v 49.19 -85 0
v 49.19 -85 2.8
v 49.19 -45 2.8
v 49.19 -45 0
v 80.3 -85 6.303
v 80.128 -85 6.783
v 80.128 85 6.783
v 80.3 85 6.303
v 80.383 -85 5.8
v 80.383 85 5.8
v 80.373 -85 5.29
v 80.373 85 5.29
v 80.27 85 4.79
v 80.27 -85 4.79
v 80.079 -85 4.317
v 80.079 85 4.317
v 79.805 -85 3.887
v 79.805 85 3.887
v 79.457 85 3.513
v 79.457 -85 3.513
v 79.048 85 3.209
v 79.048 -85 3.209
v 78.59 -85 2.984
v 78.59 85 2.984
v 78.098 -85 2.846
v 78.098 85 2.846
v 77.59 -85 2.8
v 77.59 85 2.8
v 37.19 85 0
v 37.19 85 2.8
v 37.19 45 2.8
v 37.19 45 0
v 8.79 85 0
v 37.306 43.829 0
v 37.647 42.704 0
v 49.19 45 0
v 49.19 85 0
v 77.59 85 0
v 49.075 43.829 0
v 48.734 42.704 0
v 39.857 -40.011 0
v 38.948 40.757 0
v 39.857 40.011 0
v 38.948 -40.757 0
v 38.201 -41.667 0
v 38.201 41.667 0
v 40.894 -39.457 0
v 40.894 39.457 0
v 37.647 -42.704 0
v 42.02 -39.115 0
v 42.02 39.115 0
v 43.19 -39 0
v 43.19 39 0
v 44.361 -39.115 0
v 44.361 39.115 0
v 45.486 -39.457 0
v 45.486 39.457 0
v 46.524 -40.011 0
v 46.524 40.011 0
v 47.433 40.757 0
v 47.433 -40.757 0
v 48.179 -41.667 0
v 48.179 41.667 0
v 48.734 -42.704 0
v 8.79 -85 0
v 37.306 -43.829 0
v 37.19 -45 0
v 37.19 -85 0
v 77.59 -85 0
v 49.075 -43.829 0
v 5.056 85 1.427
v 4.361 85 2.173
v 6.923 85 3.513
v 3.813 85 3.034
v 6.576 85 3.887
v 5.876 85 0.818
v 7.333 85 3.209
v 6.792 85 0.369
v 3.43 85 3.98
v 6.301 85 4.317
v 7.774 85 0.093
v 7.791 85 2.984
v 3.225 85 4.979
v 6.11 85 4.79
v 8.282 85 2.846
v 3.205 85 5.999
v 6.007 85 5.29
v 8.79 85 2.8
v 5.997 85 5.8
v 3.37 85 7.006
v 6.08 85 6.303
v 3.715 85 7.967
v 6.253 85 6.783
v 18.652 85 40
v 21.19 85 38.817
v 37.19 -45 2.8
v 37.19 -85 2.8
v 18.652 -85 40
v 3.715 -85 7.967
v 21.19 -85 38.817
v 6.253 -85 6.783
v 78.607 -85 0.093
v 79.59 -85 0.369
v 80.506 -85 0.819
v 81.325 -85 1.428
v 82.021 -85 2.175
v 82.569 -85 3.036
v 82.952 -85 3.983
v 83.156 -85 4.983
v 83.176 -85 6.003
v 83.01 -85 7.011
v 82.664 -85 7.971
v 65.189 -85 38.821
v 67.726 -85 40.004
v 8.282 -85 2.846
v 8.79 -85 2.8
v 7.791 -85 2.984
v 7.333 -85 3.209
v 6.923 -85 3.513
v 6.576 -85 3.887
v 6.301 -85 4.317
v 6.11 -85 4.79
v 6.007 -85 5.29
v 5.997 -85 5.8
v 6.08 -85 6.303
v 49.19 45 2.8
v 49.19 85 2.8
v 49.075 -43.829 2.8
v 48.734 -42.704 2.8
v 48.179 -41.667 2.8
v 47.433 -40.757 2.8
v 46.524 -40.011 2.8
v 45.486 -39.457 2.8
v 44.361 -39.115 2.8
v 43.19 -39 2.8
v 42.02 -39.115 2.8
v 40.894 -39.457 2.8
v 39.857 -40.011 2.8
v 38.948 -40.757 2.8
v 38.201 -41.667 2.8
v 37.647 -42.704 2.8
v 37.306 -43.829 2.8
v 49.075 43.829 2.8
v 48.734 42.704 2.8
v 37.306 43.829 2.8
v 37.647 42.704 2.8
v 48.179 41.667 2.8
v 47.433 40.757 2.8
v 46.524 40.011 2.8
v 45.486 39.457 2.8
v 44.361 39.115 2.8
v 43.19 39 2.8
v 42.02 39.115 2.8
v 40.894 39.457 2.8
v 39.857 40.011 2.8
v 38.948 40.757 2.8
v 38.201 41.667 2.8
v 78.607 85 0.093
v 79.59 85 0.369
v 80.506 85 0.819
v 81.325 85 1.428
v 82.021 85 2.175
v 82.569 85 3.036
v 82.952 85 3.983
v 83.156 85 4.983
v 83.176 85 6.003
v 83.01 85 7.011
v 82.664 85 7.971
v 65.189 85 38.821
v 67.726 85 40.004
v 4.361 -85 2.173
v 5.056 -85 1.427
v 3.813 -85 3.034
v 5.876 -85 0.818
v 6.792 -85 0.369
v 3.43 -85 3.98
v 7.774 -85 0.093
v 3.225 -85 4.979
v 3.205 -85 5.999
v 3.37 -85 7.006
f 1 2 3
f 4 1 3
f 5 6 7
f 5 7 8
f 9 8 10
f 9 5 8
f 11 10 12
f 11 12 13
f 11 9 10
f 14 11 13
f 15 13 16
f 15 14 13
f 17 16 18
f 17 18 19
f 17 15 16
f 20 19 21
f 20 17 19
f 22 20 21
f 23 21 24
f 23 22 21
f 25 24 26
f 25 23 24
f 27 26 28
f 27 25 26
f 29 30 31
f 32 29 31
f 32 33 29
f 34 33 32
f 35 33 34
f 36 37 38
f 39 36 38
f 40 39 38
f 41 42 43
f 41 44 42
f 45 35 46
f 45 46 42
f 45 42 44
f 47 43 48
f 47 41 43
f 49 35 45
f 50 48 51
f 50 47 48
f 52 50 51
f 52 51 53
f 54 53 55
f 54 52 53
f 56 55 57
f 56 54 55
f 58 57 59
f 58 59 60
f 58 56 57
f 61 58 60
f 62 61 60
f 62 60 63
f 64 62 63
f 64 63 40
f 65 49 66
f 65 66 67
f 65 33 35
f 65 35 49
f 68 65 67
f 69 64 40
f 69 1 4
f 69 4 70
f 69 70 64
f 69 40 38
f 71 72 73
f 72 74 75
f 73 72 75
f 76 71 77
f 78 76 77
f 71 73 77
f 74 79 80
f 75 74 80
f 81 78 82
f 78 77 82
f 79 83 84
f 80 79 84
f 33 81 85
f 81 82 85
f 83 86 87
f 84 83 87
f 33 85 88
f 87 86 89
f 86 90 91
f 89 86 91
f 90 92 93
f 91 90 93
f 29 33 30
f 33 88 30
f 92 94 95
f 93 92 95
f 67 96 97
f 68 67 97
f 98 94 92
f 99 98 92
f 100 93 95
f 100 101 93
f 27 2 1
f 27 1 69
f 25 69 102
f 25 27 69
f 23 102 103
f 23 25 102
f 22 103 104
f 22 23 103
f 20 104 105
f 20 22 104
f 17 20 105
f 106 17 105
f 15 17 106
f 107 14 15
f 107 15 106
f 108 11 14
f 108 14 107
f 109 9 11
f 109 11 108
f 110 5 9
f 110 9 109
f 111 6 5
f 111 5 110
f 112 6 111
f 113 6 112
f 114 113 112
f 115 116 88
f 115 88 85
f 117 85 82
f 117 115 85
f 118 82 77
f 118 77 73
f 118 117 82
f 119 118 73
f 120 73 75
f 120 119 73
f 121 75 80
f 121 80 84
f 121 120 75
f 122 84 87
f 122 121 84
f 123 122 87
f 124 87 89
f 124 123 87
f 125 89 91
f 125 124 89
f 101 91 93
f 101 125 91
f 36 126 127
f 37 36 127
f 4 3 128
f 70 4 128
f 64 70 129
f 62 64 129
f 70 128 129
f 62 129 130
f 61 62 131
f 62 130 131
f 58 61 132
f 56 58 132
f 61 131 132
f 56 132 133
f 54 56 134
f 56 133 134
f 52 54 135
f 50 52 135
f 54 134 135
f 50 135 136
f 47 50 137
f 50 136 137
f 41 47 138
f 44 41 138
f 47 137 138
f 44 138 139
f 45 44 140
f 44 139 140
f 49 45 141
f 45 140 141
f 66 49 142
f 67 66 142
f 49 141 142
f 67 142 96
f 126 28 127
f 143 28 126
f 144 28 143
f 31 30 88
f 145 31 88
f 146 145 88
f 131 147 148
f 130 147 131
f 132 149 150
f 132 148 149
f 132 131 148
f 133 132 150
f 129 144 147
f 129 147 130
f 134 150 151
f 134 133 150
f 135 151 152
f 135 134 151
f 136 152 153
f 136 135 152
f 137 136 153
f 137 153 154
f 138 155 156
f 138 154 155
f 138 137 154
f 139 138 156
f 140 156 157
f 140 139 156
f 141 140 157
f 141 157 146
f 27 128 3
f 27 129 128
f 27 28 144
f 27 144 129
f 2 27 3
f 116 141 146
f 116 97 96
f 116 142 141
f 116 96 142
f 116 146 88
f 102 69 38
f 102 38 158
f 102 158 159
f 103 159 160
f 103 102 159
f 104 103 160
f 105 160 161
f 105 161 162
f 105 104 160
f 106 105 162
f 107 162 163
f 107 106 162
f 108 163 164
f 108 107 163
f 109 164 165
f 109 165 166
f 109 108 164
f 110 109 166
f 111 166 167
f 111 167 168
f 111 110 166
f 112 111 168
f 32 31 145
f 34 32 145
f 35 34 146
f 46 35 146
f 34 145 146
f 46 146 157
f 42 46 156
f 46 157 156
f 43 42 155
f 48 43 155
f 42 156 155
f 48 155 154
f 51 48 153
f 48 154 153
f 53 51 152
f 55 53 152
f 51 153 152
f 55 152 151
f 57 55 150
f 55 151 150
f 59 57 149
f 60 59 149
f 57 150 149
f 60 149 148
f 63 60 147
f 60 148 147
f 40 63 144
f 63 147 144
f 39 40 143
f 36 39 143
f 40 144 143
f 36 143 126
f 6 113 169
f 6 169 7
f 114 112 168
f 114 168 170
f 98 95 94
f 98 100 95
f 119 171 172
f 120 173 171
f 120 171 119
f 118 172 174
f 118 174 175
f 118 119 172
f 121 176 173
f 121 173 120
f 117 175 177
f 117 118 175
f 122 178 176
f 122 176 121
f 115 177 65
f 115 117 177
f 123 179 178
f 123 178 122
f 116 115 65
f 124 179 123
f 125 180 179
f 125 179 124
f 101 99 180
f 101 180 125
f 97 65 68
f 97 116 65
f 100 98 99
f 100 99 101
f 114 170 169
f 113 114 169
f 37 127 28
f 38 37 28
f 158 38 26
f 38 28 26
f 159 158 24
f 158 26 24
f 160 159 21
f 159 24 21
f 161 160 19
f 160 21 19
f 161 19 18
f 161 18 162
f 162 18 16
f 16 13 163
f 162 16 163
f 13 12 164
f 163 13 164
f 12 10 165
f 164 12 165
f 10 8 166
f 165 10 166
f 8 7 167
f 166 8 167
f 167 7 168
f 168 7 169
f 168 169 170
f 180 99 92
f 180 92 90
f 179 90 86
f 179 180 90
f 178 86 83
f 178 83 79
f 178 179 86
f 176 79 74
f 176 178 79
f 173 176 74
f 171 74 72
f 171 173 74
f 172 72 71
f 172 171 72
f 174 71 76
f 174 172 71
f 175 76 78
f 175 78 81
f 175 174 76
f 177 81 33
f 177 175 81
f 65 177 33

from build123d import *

# Parameters (mm, degrees)
F1_DEPTH = 85
F3_DEPTH = 2.801


with BuildPart() as f1:
    # F0 (on Front) → F1 (new body, symmetric)
    with BuildSketch(Plane.XZ):
        with BuildLine():
            Line((18.652306, 40), (3.714916, 7.966662))
            ThreePointArc((3.714916, 7.966662), (4.067247, 2.591122), (8.790239, 0))
            Line((8.790239, 0), (77.590239, 0))
            ThreePointArc((77.590239, 0), (82.31449, 2.593095), (82.663585, 7.970904))
            Line((82.663585, 7.970904), (67.726194, 40.004241))
            Line((67.726194, 40.004241), (65.188533, 38.82091))
            Line((65.188533, 38.82091), (80.127901, 6.783331))
            ThreePointArc((80.127901, 6.783331), (79.951735, 4.095561), (77.590239, 2.8))
            Line((77.590239, 2.8), (8.790239, 2.8))
            ThreePointArc((8.790239, 2.8), (6.428743, 4.095561), (6.252577, 6.783331))
            Line((6.252577, 6.783331), (21.189968, 38.816669))
            Line((21.189968, 38.816669), (18.652306, 40))
        make_face()
    extrude(amount=F1_DEPTH, both=True)

    # F2 (on face) → F3 (cut, through all)
    with BuildSketch(Plane.XY.offset(2.8)):
        with BuildLine():
            Line((49.190239, -85), (49.190239, -45))
            ThreePointArc((49.190239, -45), (43.190239, -39), (37.190239, -45))
            Line((37.190239, -45), (37.190239, -85))
            Line((37.190239, -85), (49.190239, -85))
        make_face()
        with BuildLine():
            Line((49.190239, 45), (49.190239, 85))
            Line((49.190239, 85), (37.190239, 85))
            Line((37.190239, 85), (37.190239, 45))
            ThreePointArc((37.190239, 45), (43.190239, 39), (49.190239, 45))
        make_face()
    extrude(amount=-F3_DEPTH, mode=Mode.SUBTRACT)


solid = f1.part
